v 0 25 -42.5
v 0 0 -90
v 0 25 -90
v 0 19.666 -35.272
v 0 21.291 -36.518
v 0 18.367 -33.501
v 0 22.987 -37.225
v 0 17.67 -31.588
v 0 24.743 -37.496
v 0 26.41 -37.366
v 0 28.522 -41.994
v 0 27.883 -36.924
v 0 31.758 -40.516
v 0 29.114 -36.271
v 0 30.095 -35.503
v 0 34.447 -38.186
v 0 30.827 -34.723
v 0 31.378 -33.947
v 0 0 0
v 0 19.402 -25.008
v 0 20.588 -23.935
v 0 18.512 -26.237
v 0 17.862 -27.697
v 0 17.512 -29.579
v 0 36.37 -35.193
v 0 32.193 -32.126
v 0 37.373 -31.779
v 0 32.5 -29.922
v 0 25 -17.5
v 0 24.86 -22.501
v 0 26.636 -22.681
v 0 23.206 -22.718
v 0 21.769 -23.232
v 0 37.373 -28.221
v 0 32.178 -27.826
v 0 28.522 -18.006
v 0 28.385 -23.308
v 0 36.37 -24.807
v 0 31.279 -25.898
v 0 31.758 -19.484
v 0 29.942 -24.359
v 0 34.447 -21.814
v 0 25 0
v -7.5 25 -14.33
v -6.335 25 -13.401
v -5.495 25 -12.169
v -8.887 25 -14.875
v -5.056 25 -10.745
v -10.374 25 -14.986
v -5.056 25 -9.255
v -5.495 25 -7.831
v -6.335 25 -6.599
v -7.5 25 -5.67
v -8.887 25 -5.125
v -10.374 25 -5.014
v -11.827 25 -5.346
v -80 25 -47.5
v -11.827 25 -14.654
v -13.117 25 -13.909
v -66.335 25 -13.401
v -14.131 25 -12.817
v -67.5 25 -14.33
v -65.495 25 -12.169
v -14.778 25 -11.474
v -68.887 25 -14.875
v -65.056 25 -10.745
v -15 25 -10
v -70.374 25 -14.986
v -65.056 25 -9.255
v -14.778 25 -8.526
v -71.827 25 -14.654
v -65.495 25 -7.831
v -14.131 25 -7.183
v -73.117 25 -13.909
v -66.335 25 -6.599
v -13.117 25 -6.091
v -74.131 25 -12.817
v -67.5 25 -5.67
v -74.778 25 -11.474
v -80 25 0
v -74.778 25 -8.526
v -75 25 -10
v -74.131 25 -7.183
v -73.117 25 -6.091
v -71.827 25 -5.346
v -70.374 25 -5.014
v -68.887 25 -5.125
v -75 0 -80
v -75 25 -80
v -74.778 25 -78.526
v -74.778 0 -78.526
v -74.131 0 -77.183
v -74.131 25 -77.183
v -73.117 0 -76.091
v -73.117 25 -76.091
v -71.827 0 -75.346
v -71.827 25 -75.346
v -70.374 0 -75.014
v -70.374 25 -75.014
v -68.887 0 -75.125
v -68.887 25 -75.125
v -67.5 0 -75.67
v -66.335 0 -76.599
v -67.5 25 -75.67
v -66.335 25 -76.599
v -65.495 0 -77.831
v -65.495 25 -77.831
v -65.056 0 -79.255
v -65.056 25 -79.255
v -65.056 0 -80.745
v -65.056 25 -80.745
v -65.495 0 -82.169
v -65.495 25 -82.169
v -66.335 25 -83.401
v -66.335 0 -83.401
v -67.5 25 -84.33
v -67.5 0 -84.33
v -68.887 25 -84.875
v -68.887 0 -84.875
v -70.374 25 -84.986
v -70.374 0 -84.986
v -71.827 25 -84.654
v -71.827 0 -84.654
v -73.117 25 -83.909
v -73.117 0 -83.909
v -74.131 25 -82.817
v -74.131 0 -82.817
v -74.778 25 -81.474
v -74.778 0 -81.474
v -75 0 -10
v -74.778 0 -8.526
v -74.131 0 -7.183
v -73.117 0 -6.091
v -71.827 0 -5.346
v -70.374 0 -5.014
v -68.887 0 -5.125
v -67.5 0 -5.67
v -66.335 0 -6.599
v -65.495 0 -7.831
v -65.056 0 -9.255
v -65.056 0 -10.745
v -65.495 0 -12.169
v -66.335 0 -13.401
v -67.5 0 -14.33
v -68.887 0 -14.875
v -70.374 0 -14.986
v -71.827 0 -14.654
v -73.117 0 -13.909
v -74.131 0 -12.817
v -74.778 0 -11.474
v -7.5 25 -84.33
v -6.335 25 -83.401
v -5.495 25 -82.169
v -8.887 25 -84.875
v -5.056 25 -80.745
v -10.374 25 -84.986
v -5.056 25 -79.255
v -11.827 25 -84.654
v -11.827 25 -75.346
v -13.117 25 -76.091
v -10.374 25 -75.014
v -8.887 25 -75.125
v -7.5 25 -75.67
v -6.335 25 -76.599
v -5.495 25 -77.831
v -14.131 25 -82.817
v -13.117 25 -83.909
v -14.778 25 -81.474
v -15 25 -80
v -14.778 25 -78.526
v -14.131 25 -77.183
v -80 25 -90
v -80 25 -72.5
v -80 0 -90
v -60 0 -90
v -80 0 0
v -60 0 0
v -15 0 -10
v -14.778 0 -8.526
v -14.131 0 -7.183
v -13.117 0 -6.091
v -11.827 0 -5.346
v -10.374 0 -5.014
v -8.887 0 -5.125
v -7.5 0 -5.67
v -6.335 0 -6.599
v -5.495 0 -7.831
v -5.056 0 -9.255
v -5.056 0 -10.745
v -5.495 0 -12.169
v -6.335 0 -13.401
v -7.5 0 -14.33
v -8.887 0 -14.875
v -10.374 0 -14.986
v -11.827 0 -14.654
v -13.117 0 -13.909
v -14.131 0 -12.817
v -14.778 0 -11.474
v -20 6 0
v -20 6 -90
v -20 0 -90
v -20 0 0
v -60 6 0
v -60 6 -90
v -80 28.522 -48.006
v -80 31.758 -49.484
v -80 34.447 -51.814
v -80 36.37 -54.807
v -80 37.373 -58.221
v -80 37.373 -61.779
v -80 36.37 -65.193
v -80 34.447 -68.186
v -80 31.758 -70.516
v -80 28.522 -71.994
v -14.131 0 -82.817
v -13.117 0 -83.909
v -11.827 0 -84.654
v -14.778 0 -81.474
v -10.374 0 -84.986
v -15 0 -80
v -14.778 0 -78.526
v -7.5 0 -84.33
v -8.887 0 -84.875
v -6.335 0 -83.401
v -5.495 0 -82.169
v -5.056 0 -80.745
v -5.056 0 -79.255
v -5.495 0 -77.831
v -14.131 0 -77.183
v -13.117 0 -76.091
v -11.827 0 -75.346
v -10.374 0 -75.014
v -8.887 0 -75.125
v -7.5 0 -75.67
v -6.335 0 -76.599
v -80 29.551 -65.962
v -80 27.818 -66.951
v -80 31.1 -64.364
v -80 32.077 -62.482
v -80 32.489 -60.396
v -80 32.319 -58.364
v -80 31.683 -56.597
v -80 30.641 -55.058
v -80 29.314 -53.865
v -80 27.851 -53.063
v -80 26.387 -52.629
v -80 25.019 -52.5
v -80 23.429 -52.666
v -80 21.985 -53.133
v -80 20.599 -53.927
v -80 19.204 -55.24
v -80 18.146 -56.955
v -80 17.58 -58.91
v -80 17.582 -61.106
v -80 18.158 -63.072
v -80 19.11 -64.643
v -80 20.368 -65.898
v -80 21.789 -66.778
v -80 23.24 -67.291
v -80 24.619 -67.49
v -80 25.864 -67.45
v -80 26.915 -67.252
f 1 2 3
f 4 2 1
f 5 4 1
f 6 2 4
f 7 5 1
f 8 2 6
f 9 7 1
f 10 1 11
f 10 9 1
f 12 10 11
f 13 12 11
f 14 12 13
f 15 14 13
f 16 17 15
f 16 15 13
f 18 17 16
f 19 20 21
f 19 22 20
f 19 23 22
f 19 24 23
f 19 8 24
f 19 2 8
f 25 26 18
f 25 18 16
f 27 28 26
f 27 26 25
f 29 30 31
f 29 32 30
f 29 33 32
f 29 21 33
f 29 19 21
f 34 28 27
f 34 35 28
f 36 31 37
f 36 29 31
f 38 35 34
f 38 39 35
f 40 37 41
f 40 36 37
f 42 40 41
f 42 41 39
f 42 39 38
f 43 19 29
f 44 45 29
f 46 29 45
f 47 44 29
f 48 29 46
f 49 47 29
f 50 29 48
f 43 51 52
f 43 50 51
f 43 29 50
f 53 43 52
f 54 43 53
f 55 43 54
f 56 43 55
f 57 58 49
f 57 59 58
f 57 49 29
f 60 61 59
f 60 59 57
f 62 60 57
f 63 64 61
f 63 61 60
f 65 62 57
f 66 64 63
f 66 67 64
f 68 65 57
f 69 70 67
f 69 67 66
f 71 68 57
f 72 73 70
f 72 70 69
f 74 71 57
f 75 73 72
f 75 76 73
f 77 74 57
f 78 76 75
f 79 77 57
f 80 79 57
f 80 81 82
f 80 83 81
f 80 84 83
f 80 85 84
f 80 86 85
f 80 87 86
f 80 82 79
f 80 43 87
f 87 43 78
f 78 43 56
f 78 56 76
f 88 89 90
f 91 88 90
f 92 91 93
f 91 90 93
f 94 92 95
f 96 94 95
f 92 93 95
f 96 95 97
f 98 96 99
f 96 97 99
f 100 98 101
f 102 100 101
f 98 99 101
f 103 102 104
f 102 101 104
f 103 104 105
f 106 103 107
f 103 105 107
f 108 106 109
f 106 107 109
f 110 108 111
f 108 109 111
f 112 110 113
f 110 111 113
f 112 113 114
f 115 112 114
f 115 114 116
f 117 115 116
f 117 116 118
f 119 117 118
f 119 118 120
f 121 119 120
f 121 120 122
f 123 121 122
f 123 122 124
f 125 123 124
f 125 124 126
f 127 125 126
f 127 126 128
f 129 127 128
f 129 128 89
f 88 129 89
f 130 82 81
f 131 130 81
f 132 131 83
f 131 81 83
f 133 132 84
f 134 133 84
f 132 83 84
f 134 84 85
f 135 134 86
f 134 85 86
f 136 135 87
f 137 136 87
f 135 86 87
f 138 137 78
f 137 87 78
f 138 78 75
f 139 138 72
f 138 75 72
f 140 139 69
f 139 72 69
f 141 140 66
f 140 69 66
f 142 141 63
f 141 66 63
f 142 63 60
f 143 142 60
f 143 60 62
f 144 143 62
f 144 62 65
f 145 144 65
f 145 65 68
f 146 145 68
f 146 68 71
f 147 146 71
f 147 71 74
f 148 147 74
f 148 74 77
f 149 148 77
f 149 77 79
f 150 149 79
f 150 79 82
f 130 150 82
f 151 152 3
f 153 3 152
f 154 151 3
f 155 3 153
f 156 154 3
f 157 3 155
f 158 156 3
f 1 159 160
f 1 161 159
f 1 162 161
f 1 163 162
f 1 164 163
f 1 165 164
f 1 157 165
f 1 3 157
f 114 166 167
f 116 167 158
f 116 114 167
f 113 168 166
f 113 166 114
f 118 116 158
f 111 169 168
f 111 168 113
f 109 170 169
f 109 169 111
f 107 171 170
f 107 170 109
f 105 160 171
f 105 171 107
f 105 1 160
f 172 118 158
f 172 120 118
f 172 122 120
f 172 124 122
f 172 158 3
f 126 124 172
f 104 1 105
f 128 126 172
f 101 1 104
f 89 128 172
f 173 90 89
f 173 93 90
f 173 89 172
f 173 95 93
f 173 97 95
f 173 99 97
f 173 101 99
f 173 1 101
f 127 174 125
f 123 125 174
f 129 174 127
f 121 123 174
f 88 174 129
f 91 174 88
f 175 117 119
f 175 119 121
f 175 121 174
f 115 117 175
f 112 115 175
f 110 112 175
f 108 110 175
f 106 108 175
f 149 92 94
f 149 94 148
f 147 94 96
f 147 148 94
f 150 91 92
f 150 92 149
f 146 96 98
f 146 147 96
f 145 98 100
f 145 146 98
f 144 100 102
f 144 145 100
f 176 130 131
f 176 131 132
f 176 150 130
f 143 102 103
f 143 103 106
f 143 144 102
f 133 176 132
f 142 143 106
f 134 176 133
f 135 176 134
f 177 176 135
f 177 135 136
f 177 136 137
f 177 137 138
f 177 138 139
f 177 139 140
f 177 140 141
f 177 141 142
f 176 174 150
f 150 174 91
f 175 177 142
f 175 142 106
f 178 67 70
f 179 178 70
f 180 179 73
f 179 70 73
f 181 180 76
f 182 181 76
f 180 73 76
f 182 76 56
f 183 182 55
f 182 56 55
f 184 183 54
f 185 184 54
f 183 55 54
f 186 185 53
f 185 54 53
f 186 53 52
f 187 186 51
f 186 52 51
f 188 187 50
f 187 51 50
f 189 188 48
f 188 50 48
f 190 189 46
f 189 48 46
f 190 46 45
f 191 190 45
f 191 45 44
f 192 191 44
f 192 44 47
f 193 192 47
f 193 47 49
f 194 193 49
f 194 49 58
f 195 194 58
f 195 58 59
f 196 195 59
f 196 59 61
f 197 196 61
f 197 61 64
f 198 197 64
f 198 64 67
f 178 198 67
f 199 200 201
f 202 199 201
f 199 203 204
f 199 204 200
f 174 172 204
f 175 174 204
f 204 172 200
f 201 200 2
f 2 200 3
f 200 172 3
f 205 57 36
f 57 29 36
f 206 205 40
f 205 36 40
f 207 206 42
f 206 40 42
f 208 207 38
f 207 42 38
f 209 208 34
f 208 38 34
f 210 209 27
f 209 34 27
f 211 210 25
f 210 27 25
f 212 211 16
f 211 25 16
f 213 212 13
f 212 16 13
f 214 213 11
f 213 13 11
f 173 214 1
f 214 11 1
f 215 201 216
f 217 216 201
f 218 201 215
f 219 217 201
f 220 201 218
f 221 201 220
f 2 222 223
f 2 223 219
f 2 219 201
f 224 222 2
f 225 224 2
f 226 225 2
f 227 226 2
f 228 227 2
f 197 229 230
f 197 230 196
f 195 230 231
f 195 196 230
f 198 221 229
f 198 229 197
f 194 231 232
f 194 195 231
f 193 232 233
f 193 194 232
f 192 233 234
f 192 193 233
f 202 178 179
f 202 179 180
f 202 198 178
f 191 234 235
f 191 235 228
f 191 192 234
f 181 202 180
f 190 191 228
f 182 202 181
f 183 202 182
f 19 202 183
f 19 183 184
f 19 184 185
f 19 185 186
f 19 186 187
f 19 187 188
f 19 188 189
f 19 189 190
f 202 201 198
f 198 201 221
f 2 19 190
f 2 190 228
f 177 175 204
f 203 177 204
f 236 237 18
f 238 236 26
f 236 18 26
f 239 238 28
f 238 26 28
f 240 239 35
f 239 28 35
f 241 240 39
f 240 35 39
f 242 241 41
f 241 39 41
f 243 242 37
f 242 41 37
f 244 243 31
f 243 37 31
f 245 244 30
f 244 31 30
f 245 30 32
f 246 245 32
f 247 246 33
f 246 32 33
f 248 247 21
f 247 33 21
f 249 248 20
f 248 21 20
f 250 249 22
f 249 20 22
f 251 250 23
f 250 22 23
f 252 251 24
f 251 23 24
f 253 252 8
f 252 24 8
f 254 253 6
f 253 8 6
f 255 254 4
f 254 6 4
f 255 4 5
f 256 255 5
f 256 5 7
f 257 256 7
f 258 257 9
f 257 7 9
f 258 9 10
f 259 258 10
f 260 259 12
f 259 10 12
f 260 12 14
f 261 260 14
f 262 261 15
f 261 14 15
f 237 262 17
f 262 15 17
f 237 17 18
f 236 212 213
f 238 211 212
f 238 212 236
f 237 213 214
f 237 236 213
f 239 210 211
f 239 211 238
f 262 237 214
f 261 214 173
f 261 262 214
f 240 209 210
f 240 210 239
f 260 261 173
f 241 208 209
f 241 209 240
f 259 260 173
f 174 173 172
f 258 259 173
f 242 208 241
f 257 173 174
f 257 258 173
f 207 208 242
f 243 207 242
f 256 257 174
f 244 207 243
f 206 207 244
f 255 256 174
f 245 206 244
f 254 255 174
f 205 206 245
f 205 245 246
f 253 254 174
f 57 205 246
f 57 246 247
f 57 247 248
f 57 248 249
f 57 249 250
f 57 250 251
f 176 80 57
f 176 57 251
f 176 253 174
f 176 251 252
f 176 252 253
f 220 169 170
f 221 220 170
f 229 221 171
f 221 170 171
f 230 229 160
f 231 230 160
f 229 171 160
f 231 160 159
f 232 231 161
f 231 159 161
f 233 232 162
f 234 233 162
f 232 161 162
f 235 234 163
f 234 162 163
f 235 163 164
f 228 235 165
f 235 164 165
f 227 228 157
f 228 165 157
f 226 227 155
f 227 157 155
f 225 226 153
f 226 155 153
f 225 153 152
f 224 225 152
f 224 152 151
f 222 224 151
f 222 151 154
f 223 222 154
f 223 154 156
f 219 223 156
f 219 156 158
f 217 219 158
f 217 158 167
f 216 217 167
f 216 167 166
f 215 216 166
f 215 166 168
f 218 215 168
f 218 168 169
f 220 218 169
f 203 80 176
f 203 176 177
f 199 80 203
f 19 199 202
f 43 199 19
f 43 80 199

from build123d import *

# Parameters (mm, degrees)
SALIENTE_EXTRUIR1_DEPTH = 90
CORTAR_EXTRUIR1_REACH   = 124.984
CROQUIS3_R              = 5


with BuildPart() as part:
    # Croquis2 → Saliente-Extruir1 (new body)
    with BuildSketch(Plane.XY):
        Polygon((0, 0), (0, 25), (-80, 25), (-80, 0), (-60, 0), (-60, 6), (-20, 6), (-20, 0), align=None)
    extrude(amount=-SALIENTE_EXTRUIR1_DEPTH)

    # Croquis3 → Cortar-Extruir1 (cut, up to next)
    with BuildSketch(Plane(origin=(0, 25, 0), x_dir=(1, 0, 0), z_dir=(0, 1, 0)), mode=Mode.PRIVATE) as cortar_extruir1_sk1:
        with Locations(Location((-70, 80, 0), (0, 0, 180))):
            Circle(CROQUIS3_R)
    cortar_extruir1_tool1 = extrude(cortar_extruir1_sk1.sketch, amount=-CORTAR_EXTRUIR1_REACH, mode=Mode.PRIVATE) & part.part
    # Croquis3 → Cortar-Extruir1 (cut, up to next)
    with BuildSketch(Plane(origin=(0, 25, 0), x_dir=(1, 0, 0), z_dir=(0, 1, 0)), mode=Mode.PRIVATE) as cortar_extruir1_sk2:
        with Locations(Location((-10, 80, 0), (0, 0, 180))):
            Circle(CROQUIS3_R)
    cortar_extruir1_tool2 = extrude(cortar_extruir1_sk2.sketch, amount=-CORTAR_EXTRUIR1_REACH, mode=Mode.PRIVATE) & part.part
    # Croquis3 → Cortar-Extruir1 (cut, up to next)
    with BuildSketch(Plane(origin=(0, 25, 0), x_dir=(1, 0, 0), z_dir=(0, 1, 0)), mode=Mode.PRIVATE) as cortar_extruir1_sk3:
        with Locations(Location((-10, 10, 0), (0, 0, 180))):
            Circle(CROQUIS3_R)
    cortar_extruir1_tool3 = extrude(cortar_extruir1_sk3.sketch, amount=-CORTAR_EXTRUIR1_REACH, mode=Mode.PRIVATE) & part.part
    # Croquis3 → Cortar-Extruir1 (cut, up to next)
    with BuildSketch(Plane(origin=(0, 25, 0), x_dir=(1, 0, 0), z_dir=(0, 1, 0)), mode=Mode.PRIVATE) as cortar_extruir1_sk4:
        with Locations(Location((-70, 10, 0), (0, 0, 180))):
            Circle(CROQUIS3_R)
    cortar_extruir1_tool4 = extrude(cortar_extruir1_sk4.sketch, amount=-CORTAR_EXTRUIR1_REACH, mode=Mode.PRIVATE) & part.part
    add(cortar_extruir1_tool1.solids().sort_by_distance((-70, 25, -80))[0], mode=Mode.SUBTRACT)
    add(cortar_extruir1_tool2.solids().sort_by_distance((-10, 25, -80))[0], mode=Mode.SUBTRACT)
    add(cortar_extruir1_tool3.solids().sort_by_distance((-10, 25, -10))[0], mode=Mode.SUBTRACT)
    add(cortar_extruir1_tool4.solids().sort_by_distance((-70, 25, -10))[0], mode=Mode.SUBTRACT)

    # Croquis5 → Recubrir1 section 0
    with BuildSketch(Plane.ZY.offset(80)):
        with BuildLine():
            Line((-72.5, 25), (-47.5, 25))
            ThreePointArc((-47.5, 25), (-60, 37.5), (-72.5, 25))
        make_face()
    # Croquis4 → Recubrir1 section 1
    with BuildSketch(Plane(origin=(0, 0, 0), x_dir=(0, 0, -1), z_dir=(1, 0, 0))):
        with BuildLine():
            Line((42.5, 25), (17.5, 25))
            ThreePointArc((17.5, 25), (30, 37.5), (42.5, 25))
        make_face()
    loft()

    # Cortar-Recubrir1: read off the stored shape, not the designer's step
    # Cortar-Recubrir1: loft between two sections, ruled curve by curve
    cortar_recubrir1_from = [
        Edge.make_bspline([(-80, 27.8178005, -66.950539572), (-80, 28.397012131, -66.715722864), (-80, 29.023662616, -66.379666069), (-80, 29.965028032, -65.63546774), (-80, 30.27819737, -65.347207423), (-80, 30.878995513, -64.678611595), (-80, 31.166580719, -64.298055634), (-80, 31.682547567, -63.441447082), (-80, 31.910716085, -62.965172363), (-80, 32.268300366, -61.929262486), (-80, 32.397319654, -61.369555656), (-80, 32.520385943, -60.19953953), (-80, 32.51399771, -59.589467861), (-80, 32.346580783, -58.370138344), (-80, 32.18535628, -57.761411131), (-80, 31.715722864, -56.602987869), (-80, 31.407536262, -56.053840186), (-80, 30.678592509, -55.062157825), (-80, 30.258345404, -54.619867625), (-80, 29.355265136, -53.865858955), (-80, 28.87290981, -53.554007946), (-80, 27.894905327, -53.059555699), (-80, 27.399490807, -52.876626932), (-80, 26.43267588, -52.621149153), (-80, 25.961273747, -52.548292311), (-80, 25.064501609, -52.486822627), (-80, 24.639009381, -52.49802121), (-80, 23.44516904, -52.619451193), (-80, 22.761411131, -52.81464372), (-80, 21.602987869, -53.284277136), (-80, 20.976337384, -53.620333931), (-80, 20.034971968, -54.36453226), (-80, 19.72180263, -54.652792577), (-80, 19.121004487, -55.321388405), (-80, 18.833419281, -55.701944366), (-80, 18.317452433, -56.558552918), (-80, 18.089283915, -57.034827637), (-80, 17.731699634, -58.070737514), (-80, 17.602680346, -58.630444344), (-80, 17.479614057, -59.80046047), (-80, 17.48600229, -60.410532139), (-80, 17.653419217, -61.629861656), (-80, 17.81464372, -62.238588869), (-80, 18.284277136, -63.397012131), (-80, 18.592463738, -63.946159814), (-80, 19.321407491, -64.937842175), (-80, 19.741654596, -65.380132375), (-80, 20.644734864, -66.134141045), (-80, 21.12709019, -66.445992054), (-80, 22.105094673, -66.940444301), (-80, 22.600509193, -67.123373068), (-80, 23.56732412, -67.378850847), (-80, 24.038726253, -67.451707689), (-80, 24.935498391, -67.513177373), (-80, 25.360990619, -67.50197879), (-80, 26.55483096, -67.380548807), (-80, 27.238588869, -67.18535628), (-80, 27.8178005, -66.950539572)], [0, 0, 0, 0, 0.0625, 0.0625, 0.09375, 0.09375, 0.125, 0.125, 0.15625, 0.15625, 0.1875, 0.1875, 0.21875, 0.21875, 0.25, 0.25, 0.28125, 0.28125, 0.3125, 0.3125, 0.34375, 0.34375, 0.375, 0.375, 0.40625, 0.40625, 0.4375, 0.4375, 0.5, 0.5, 0.5625, 0.5625, 0.59375, 0.59375, 0.625, 0.625, 0.65625, 0.65625, 0.6875, 0.6875, 0.71875, 0.71875, 0.75, 0.75, 0.78125, 0.78125, 0.8125, 0.8125, 0.84375, 0.84375, 0.875, 0.875, 0.90625, 0.90625, 0.9375, 0.9375, 1, 1, 1, 1], 3),
    ]
    cortar_recubrir1_to = [
        Edge.make_bspline([(0, 31.377503921, -33.946827047), (0, 31.706406175, -33.415368387), (0, 32.013835032, -32.774187836), (0, 32.33435549, -31.617785382), (0, 32.416968296, -31.200239973), (0, 32.507224255, -30.305906337), (0, 32.514702079, -29.828965909), (0, 32.425496651, -28.83295266), (0, 32.328510244, -28.313826359), (0, 32.005617859, -27.266584123), (0, 31.779349551, -26.738644387), (0, 31.187995987, -25.721597678), (0, 30.822699703, -25.232939438), (0, 29.967766964, -24.347567814), (0, 29.478285707, -23.951398333), (0, 28.415368387, -23.293593825), (0, 27.84243548, -23.032270186), (0, 26.668642711, -22.662130437), (0, 26.06833886, -22.553210568), (0, 24.894293414, -22.477709998), (0, 24.320859272, -22.510740236), (0, 23.239559888, -22.688974452), (0, 22.73169069, -22.833775549), (0, 21.800495492, -23.198296471), (0, 21.37698638, -23.417768843), (0, 20.616854994, -23.897538648), (0, 20.280022745, -24.15775602), (0, 19.388077935, -24.960522771), (0, 18.951398333, -25.521714293), (0, 18.293593825, -26.584631613), (0, 17.986164968, -27.225812164), (0, 17.66564451, -28.382214618), (0, 17.583031704, -28.799760027), (0, 17.492775745, -29.694093663), (0, 17.485297921, -30.171034091), (0, 17.574503349, -31.16704734), (0, 17.671489756, -31.686173641), (0, 17.994382141, -32.733415877), (0, 18.220650449, -33.261355613), (0, 18.812004013, -34.278402322), (0, 19.177300297, -34.767060562), (0, 20.032233036, -35.652432186), (0, 20.521714293, -36.048601667), (0, 21.584631613, -36.706406175), (0, 22.15756452, -36.967729814), (0, 23.331357289, -37.337869563), (0, 23.93166114, -37.446789432), (0, 25.105706586, -37.522290002), (0, 25.679140728, -37.489259764), (0, 26.760440112, -37.311025548), (0, 27.26830931, -37.166224451), (0, 28.199504508, -36.801703529), (0, 28.62301362, -36.582231157), (0, 29.383145006, -36.102461352), (0, 29.719977255, -35.84224398), (0, 30.611922065, -35.039477229), (0, 31.048601667, -34.478285707), (0, 31.377503921, -33.946827047)], [0, 0, 0, 0, 0.0625, 0.0625, 0.09375, 0.09375, 0.125, 0.125, 0.15625, 0.15625, 0.1875, 0.1875, 0.21875, 0.21875, 0.25, 0.25, 0.28125, 0.28125, 0.3125, 0.3125, 0.34375, 0.34375, 0.375, 0.375, 0.40625, 0.40625, 0.4375, 0.4375, 0.5, 0.5, 0.5625, 0.5625, 0.59375, 0.59375, 0.625, 0.625, 0.65625, 0.65625, 0.6875, 0.6875, 0.71875, 0.71875, 0.75, 0.75, 0.78125, 0.78125, 0.8125, 0.8125, 0.84375, 0.84375, 0.875, 0.875, 0.90625, 0.90625, 0.9375, 0.9375, 1, 1, 1, 1], 3),
    ]
    cortar_recubrir1 = Solid(Shell([*[Face.make_surface_from_curves(cortar_recubrir1_from[k], cortar_recubrir1_to[k]) for k in range(1)], Face(Wire(cortar_recubrir1_from)), Face(Wire(cortar_recubrir1_to))]))
    add(cortar_recubrir1, mode=Mode.SUBTRACT)


solid = part.part
